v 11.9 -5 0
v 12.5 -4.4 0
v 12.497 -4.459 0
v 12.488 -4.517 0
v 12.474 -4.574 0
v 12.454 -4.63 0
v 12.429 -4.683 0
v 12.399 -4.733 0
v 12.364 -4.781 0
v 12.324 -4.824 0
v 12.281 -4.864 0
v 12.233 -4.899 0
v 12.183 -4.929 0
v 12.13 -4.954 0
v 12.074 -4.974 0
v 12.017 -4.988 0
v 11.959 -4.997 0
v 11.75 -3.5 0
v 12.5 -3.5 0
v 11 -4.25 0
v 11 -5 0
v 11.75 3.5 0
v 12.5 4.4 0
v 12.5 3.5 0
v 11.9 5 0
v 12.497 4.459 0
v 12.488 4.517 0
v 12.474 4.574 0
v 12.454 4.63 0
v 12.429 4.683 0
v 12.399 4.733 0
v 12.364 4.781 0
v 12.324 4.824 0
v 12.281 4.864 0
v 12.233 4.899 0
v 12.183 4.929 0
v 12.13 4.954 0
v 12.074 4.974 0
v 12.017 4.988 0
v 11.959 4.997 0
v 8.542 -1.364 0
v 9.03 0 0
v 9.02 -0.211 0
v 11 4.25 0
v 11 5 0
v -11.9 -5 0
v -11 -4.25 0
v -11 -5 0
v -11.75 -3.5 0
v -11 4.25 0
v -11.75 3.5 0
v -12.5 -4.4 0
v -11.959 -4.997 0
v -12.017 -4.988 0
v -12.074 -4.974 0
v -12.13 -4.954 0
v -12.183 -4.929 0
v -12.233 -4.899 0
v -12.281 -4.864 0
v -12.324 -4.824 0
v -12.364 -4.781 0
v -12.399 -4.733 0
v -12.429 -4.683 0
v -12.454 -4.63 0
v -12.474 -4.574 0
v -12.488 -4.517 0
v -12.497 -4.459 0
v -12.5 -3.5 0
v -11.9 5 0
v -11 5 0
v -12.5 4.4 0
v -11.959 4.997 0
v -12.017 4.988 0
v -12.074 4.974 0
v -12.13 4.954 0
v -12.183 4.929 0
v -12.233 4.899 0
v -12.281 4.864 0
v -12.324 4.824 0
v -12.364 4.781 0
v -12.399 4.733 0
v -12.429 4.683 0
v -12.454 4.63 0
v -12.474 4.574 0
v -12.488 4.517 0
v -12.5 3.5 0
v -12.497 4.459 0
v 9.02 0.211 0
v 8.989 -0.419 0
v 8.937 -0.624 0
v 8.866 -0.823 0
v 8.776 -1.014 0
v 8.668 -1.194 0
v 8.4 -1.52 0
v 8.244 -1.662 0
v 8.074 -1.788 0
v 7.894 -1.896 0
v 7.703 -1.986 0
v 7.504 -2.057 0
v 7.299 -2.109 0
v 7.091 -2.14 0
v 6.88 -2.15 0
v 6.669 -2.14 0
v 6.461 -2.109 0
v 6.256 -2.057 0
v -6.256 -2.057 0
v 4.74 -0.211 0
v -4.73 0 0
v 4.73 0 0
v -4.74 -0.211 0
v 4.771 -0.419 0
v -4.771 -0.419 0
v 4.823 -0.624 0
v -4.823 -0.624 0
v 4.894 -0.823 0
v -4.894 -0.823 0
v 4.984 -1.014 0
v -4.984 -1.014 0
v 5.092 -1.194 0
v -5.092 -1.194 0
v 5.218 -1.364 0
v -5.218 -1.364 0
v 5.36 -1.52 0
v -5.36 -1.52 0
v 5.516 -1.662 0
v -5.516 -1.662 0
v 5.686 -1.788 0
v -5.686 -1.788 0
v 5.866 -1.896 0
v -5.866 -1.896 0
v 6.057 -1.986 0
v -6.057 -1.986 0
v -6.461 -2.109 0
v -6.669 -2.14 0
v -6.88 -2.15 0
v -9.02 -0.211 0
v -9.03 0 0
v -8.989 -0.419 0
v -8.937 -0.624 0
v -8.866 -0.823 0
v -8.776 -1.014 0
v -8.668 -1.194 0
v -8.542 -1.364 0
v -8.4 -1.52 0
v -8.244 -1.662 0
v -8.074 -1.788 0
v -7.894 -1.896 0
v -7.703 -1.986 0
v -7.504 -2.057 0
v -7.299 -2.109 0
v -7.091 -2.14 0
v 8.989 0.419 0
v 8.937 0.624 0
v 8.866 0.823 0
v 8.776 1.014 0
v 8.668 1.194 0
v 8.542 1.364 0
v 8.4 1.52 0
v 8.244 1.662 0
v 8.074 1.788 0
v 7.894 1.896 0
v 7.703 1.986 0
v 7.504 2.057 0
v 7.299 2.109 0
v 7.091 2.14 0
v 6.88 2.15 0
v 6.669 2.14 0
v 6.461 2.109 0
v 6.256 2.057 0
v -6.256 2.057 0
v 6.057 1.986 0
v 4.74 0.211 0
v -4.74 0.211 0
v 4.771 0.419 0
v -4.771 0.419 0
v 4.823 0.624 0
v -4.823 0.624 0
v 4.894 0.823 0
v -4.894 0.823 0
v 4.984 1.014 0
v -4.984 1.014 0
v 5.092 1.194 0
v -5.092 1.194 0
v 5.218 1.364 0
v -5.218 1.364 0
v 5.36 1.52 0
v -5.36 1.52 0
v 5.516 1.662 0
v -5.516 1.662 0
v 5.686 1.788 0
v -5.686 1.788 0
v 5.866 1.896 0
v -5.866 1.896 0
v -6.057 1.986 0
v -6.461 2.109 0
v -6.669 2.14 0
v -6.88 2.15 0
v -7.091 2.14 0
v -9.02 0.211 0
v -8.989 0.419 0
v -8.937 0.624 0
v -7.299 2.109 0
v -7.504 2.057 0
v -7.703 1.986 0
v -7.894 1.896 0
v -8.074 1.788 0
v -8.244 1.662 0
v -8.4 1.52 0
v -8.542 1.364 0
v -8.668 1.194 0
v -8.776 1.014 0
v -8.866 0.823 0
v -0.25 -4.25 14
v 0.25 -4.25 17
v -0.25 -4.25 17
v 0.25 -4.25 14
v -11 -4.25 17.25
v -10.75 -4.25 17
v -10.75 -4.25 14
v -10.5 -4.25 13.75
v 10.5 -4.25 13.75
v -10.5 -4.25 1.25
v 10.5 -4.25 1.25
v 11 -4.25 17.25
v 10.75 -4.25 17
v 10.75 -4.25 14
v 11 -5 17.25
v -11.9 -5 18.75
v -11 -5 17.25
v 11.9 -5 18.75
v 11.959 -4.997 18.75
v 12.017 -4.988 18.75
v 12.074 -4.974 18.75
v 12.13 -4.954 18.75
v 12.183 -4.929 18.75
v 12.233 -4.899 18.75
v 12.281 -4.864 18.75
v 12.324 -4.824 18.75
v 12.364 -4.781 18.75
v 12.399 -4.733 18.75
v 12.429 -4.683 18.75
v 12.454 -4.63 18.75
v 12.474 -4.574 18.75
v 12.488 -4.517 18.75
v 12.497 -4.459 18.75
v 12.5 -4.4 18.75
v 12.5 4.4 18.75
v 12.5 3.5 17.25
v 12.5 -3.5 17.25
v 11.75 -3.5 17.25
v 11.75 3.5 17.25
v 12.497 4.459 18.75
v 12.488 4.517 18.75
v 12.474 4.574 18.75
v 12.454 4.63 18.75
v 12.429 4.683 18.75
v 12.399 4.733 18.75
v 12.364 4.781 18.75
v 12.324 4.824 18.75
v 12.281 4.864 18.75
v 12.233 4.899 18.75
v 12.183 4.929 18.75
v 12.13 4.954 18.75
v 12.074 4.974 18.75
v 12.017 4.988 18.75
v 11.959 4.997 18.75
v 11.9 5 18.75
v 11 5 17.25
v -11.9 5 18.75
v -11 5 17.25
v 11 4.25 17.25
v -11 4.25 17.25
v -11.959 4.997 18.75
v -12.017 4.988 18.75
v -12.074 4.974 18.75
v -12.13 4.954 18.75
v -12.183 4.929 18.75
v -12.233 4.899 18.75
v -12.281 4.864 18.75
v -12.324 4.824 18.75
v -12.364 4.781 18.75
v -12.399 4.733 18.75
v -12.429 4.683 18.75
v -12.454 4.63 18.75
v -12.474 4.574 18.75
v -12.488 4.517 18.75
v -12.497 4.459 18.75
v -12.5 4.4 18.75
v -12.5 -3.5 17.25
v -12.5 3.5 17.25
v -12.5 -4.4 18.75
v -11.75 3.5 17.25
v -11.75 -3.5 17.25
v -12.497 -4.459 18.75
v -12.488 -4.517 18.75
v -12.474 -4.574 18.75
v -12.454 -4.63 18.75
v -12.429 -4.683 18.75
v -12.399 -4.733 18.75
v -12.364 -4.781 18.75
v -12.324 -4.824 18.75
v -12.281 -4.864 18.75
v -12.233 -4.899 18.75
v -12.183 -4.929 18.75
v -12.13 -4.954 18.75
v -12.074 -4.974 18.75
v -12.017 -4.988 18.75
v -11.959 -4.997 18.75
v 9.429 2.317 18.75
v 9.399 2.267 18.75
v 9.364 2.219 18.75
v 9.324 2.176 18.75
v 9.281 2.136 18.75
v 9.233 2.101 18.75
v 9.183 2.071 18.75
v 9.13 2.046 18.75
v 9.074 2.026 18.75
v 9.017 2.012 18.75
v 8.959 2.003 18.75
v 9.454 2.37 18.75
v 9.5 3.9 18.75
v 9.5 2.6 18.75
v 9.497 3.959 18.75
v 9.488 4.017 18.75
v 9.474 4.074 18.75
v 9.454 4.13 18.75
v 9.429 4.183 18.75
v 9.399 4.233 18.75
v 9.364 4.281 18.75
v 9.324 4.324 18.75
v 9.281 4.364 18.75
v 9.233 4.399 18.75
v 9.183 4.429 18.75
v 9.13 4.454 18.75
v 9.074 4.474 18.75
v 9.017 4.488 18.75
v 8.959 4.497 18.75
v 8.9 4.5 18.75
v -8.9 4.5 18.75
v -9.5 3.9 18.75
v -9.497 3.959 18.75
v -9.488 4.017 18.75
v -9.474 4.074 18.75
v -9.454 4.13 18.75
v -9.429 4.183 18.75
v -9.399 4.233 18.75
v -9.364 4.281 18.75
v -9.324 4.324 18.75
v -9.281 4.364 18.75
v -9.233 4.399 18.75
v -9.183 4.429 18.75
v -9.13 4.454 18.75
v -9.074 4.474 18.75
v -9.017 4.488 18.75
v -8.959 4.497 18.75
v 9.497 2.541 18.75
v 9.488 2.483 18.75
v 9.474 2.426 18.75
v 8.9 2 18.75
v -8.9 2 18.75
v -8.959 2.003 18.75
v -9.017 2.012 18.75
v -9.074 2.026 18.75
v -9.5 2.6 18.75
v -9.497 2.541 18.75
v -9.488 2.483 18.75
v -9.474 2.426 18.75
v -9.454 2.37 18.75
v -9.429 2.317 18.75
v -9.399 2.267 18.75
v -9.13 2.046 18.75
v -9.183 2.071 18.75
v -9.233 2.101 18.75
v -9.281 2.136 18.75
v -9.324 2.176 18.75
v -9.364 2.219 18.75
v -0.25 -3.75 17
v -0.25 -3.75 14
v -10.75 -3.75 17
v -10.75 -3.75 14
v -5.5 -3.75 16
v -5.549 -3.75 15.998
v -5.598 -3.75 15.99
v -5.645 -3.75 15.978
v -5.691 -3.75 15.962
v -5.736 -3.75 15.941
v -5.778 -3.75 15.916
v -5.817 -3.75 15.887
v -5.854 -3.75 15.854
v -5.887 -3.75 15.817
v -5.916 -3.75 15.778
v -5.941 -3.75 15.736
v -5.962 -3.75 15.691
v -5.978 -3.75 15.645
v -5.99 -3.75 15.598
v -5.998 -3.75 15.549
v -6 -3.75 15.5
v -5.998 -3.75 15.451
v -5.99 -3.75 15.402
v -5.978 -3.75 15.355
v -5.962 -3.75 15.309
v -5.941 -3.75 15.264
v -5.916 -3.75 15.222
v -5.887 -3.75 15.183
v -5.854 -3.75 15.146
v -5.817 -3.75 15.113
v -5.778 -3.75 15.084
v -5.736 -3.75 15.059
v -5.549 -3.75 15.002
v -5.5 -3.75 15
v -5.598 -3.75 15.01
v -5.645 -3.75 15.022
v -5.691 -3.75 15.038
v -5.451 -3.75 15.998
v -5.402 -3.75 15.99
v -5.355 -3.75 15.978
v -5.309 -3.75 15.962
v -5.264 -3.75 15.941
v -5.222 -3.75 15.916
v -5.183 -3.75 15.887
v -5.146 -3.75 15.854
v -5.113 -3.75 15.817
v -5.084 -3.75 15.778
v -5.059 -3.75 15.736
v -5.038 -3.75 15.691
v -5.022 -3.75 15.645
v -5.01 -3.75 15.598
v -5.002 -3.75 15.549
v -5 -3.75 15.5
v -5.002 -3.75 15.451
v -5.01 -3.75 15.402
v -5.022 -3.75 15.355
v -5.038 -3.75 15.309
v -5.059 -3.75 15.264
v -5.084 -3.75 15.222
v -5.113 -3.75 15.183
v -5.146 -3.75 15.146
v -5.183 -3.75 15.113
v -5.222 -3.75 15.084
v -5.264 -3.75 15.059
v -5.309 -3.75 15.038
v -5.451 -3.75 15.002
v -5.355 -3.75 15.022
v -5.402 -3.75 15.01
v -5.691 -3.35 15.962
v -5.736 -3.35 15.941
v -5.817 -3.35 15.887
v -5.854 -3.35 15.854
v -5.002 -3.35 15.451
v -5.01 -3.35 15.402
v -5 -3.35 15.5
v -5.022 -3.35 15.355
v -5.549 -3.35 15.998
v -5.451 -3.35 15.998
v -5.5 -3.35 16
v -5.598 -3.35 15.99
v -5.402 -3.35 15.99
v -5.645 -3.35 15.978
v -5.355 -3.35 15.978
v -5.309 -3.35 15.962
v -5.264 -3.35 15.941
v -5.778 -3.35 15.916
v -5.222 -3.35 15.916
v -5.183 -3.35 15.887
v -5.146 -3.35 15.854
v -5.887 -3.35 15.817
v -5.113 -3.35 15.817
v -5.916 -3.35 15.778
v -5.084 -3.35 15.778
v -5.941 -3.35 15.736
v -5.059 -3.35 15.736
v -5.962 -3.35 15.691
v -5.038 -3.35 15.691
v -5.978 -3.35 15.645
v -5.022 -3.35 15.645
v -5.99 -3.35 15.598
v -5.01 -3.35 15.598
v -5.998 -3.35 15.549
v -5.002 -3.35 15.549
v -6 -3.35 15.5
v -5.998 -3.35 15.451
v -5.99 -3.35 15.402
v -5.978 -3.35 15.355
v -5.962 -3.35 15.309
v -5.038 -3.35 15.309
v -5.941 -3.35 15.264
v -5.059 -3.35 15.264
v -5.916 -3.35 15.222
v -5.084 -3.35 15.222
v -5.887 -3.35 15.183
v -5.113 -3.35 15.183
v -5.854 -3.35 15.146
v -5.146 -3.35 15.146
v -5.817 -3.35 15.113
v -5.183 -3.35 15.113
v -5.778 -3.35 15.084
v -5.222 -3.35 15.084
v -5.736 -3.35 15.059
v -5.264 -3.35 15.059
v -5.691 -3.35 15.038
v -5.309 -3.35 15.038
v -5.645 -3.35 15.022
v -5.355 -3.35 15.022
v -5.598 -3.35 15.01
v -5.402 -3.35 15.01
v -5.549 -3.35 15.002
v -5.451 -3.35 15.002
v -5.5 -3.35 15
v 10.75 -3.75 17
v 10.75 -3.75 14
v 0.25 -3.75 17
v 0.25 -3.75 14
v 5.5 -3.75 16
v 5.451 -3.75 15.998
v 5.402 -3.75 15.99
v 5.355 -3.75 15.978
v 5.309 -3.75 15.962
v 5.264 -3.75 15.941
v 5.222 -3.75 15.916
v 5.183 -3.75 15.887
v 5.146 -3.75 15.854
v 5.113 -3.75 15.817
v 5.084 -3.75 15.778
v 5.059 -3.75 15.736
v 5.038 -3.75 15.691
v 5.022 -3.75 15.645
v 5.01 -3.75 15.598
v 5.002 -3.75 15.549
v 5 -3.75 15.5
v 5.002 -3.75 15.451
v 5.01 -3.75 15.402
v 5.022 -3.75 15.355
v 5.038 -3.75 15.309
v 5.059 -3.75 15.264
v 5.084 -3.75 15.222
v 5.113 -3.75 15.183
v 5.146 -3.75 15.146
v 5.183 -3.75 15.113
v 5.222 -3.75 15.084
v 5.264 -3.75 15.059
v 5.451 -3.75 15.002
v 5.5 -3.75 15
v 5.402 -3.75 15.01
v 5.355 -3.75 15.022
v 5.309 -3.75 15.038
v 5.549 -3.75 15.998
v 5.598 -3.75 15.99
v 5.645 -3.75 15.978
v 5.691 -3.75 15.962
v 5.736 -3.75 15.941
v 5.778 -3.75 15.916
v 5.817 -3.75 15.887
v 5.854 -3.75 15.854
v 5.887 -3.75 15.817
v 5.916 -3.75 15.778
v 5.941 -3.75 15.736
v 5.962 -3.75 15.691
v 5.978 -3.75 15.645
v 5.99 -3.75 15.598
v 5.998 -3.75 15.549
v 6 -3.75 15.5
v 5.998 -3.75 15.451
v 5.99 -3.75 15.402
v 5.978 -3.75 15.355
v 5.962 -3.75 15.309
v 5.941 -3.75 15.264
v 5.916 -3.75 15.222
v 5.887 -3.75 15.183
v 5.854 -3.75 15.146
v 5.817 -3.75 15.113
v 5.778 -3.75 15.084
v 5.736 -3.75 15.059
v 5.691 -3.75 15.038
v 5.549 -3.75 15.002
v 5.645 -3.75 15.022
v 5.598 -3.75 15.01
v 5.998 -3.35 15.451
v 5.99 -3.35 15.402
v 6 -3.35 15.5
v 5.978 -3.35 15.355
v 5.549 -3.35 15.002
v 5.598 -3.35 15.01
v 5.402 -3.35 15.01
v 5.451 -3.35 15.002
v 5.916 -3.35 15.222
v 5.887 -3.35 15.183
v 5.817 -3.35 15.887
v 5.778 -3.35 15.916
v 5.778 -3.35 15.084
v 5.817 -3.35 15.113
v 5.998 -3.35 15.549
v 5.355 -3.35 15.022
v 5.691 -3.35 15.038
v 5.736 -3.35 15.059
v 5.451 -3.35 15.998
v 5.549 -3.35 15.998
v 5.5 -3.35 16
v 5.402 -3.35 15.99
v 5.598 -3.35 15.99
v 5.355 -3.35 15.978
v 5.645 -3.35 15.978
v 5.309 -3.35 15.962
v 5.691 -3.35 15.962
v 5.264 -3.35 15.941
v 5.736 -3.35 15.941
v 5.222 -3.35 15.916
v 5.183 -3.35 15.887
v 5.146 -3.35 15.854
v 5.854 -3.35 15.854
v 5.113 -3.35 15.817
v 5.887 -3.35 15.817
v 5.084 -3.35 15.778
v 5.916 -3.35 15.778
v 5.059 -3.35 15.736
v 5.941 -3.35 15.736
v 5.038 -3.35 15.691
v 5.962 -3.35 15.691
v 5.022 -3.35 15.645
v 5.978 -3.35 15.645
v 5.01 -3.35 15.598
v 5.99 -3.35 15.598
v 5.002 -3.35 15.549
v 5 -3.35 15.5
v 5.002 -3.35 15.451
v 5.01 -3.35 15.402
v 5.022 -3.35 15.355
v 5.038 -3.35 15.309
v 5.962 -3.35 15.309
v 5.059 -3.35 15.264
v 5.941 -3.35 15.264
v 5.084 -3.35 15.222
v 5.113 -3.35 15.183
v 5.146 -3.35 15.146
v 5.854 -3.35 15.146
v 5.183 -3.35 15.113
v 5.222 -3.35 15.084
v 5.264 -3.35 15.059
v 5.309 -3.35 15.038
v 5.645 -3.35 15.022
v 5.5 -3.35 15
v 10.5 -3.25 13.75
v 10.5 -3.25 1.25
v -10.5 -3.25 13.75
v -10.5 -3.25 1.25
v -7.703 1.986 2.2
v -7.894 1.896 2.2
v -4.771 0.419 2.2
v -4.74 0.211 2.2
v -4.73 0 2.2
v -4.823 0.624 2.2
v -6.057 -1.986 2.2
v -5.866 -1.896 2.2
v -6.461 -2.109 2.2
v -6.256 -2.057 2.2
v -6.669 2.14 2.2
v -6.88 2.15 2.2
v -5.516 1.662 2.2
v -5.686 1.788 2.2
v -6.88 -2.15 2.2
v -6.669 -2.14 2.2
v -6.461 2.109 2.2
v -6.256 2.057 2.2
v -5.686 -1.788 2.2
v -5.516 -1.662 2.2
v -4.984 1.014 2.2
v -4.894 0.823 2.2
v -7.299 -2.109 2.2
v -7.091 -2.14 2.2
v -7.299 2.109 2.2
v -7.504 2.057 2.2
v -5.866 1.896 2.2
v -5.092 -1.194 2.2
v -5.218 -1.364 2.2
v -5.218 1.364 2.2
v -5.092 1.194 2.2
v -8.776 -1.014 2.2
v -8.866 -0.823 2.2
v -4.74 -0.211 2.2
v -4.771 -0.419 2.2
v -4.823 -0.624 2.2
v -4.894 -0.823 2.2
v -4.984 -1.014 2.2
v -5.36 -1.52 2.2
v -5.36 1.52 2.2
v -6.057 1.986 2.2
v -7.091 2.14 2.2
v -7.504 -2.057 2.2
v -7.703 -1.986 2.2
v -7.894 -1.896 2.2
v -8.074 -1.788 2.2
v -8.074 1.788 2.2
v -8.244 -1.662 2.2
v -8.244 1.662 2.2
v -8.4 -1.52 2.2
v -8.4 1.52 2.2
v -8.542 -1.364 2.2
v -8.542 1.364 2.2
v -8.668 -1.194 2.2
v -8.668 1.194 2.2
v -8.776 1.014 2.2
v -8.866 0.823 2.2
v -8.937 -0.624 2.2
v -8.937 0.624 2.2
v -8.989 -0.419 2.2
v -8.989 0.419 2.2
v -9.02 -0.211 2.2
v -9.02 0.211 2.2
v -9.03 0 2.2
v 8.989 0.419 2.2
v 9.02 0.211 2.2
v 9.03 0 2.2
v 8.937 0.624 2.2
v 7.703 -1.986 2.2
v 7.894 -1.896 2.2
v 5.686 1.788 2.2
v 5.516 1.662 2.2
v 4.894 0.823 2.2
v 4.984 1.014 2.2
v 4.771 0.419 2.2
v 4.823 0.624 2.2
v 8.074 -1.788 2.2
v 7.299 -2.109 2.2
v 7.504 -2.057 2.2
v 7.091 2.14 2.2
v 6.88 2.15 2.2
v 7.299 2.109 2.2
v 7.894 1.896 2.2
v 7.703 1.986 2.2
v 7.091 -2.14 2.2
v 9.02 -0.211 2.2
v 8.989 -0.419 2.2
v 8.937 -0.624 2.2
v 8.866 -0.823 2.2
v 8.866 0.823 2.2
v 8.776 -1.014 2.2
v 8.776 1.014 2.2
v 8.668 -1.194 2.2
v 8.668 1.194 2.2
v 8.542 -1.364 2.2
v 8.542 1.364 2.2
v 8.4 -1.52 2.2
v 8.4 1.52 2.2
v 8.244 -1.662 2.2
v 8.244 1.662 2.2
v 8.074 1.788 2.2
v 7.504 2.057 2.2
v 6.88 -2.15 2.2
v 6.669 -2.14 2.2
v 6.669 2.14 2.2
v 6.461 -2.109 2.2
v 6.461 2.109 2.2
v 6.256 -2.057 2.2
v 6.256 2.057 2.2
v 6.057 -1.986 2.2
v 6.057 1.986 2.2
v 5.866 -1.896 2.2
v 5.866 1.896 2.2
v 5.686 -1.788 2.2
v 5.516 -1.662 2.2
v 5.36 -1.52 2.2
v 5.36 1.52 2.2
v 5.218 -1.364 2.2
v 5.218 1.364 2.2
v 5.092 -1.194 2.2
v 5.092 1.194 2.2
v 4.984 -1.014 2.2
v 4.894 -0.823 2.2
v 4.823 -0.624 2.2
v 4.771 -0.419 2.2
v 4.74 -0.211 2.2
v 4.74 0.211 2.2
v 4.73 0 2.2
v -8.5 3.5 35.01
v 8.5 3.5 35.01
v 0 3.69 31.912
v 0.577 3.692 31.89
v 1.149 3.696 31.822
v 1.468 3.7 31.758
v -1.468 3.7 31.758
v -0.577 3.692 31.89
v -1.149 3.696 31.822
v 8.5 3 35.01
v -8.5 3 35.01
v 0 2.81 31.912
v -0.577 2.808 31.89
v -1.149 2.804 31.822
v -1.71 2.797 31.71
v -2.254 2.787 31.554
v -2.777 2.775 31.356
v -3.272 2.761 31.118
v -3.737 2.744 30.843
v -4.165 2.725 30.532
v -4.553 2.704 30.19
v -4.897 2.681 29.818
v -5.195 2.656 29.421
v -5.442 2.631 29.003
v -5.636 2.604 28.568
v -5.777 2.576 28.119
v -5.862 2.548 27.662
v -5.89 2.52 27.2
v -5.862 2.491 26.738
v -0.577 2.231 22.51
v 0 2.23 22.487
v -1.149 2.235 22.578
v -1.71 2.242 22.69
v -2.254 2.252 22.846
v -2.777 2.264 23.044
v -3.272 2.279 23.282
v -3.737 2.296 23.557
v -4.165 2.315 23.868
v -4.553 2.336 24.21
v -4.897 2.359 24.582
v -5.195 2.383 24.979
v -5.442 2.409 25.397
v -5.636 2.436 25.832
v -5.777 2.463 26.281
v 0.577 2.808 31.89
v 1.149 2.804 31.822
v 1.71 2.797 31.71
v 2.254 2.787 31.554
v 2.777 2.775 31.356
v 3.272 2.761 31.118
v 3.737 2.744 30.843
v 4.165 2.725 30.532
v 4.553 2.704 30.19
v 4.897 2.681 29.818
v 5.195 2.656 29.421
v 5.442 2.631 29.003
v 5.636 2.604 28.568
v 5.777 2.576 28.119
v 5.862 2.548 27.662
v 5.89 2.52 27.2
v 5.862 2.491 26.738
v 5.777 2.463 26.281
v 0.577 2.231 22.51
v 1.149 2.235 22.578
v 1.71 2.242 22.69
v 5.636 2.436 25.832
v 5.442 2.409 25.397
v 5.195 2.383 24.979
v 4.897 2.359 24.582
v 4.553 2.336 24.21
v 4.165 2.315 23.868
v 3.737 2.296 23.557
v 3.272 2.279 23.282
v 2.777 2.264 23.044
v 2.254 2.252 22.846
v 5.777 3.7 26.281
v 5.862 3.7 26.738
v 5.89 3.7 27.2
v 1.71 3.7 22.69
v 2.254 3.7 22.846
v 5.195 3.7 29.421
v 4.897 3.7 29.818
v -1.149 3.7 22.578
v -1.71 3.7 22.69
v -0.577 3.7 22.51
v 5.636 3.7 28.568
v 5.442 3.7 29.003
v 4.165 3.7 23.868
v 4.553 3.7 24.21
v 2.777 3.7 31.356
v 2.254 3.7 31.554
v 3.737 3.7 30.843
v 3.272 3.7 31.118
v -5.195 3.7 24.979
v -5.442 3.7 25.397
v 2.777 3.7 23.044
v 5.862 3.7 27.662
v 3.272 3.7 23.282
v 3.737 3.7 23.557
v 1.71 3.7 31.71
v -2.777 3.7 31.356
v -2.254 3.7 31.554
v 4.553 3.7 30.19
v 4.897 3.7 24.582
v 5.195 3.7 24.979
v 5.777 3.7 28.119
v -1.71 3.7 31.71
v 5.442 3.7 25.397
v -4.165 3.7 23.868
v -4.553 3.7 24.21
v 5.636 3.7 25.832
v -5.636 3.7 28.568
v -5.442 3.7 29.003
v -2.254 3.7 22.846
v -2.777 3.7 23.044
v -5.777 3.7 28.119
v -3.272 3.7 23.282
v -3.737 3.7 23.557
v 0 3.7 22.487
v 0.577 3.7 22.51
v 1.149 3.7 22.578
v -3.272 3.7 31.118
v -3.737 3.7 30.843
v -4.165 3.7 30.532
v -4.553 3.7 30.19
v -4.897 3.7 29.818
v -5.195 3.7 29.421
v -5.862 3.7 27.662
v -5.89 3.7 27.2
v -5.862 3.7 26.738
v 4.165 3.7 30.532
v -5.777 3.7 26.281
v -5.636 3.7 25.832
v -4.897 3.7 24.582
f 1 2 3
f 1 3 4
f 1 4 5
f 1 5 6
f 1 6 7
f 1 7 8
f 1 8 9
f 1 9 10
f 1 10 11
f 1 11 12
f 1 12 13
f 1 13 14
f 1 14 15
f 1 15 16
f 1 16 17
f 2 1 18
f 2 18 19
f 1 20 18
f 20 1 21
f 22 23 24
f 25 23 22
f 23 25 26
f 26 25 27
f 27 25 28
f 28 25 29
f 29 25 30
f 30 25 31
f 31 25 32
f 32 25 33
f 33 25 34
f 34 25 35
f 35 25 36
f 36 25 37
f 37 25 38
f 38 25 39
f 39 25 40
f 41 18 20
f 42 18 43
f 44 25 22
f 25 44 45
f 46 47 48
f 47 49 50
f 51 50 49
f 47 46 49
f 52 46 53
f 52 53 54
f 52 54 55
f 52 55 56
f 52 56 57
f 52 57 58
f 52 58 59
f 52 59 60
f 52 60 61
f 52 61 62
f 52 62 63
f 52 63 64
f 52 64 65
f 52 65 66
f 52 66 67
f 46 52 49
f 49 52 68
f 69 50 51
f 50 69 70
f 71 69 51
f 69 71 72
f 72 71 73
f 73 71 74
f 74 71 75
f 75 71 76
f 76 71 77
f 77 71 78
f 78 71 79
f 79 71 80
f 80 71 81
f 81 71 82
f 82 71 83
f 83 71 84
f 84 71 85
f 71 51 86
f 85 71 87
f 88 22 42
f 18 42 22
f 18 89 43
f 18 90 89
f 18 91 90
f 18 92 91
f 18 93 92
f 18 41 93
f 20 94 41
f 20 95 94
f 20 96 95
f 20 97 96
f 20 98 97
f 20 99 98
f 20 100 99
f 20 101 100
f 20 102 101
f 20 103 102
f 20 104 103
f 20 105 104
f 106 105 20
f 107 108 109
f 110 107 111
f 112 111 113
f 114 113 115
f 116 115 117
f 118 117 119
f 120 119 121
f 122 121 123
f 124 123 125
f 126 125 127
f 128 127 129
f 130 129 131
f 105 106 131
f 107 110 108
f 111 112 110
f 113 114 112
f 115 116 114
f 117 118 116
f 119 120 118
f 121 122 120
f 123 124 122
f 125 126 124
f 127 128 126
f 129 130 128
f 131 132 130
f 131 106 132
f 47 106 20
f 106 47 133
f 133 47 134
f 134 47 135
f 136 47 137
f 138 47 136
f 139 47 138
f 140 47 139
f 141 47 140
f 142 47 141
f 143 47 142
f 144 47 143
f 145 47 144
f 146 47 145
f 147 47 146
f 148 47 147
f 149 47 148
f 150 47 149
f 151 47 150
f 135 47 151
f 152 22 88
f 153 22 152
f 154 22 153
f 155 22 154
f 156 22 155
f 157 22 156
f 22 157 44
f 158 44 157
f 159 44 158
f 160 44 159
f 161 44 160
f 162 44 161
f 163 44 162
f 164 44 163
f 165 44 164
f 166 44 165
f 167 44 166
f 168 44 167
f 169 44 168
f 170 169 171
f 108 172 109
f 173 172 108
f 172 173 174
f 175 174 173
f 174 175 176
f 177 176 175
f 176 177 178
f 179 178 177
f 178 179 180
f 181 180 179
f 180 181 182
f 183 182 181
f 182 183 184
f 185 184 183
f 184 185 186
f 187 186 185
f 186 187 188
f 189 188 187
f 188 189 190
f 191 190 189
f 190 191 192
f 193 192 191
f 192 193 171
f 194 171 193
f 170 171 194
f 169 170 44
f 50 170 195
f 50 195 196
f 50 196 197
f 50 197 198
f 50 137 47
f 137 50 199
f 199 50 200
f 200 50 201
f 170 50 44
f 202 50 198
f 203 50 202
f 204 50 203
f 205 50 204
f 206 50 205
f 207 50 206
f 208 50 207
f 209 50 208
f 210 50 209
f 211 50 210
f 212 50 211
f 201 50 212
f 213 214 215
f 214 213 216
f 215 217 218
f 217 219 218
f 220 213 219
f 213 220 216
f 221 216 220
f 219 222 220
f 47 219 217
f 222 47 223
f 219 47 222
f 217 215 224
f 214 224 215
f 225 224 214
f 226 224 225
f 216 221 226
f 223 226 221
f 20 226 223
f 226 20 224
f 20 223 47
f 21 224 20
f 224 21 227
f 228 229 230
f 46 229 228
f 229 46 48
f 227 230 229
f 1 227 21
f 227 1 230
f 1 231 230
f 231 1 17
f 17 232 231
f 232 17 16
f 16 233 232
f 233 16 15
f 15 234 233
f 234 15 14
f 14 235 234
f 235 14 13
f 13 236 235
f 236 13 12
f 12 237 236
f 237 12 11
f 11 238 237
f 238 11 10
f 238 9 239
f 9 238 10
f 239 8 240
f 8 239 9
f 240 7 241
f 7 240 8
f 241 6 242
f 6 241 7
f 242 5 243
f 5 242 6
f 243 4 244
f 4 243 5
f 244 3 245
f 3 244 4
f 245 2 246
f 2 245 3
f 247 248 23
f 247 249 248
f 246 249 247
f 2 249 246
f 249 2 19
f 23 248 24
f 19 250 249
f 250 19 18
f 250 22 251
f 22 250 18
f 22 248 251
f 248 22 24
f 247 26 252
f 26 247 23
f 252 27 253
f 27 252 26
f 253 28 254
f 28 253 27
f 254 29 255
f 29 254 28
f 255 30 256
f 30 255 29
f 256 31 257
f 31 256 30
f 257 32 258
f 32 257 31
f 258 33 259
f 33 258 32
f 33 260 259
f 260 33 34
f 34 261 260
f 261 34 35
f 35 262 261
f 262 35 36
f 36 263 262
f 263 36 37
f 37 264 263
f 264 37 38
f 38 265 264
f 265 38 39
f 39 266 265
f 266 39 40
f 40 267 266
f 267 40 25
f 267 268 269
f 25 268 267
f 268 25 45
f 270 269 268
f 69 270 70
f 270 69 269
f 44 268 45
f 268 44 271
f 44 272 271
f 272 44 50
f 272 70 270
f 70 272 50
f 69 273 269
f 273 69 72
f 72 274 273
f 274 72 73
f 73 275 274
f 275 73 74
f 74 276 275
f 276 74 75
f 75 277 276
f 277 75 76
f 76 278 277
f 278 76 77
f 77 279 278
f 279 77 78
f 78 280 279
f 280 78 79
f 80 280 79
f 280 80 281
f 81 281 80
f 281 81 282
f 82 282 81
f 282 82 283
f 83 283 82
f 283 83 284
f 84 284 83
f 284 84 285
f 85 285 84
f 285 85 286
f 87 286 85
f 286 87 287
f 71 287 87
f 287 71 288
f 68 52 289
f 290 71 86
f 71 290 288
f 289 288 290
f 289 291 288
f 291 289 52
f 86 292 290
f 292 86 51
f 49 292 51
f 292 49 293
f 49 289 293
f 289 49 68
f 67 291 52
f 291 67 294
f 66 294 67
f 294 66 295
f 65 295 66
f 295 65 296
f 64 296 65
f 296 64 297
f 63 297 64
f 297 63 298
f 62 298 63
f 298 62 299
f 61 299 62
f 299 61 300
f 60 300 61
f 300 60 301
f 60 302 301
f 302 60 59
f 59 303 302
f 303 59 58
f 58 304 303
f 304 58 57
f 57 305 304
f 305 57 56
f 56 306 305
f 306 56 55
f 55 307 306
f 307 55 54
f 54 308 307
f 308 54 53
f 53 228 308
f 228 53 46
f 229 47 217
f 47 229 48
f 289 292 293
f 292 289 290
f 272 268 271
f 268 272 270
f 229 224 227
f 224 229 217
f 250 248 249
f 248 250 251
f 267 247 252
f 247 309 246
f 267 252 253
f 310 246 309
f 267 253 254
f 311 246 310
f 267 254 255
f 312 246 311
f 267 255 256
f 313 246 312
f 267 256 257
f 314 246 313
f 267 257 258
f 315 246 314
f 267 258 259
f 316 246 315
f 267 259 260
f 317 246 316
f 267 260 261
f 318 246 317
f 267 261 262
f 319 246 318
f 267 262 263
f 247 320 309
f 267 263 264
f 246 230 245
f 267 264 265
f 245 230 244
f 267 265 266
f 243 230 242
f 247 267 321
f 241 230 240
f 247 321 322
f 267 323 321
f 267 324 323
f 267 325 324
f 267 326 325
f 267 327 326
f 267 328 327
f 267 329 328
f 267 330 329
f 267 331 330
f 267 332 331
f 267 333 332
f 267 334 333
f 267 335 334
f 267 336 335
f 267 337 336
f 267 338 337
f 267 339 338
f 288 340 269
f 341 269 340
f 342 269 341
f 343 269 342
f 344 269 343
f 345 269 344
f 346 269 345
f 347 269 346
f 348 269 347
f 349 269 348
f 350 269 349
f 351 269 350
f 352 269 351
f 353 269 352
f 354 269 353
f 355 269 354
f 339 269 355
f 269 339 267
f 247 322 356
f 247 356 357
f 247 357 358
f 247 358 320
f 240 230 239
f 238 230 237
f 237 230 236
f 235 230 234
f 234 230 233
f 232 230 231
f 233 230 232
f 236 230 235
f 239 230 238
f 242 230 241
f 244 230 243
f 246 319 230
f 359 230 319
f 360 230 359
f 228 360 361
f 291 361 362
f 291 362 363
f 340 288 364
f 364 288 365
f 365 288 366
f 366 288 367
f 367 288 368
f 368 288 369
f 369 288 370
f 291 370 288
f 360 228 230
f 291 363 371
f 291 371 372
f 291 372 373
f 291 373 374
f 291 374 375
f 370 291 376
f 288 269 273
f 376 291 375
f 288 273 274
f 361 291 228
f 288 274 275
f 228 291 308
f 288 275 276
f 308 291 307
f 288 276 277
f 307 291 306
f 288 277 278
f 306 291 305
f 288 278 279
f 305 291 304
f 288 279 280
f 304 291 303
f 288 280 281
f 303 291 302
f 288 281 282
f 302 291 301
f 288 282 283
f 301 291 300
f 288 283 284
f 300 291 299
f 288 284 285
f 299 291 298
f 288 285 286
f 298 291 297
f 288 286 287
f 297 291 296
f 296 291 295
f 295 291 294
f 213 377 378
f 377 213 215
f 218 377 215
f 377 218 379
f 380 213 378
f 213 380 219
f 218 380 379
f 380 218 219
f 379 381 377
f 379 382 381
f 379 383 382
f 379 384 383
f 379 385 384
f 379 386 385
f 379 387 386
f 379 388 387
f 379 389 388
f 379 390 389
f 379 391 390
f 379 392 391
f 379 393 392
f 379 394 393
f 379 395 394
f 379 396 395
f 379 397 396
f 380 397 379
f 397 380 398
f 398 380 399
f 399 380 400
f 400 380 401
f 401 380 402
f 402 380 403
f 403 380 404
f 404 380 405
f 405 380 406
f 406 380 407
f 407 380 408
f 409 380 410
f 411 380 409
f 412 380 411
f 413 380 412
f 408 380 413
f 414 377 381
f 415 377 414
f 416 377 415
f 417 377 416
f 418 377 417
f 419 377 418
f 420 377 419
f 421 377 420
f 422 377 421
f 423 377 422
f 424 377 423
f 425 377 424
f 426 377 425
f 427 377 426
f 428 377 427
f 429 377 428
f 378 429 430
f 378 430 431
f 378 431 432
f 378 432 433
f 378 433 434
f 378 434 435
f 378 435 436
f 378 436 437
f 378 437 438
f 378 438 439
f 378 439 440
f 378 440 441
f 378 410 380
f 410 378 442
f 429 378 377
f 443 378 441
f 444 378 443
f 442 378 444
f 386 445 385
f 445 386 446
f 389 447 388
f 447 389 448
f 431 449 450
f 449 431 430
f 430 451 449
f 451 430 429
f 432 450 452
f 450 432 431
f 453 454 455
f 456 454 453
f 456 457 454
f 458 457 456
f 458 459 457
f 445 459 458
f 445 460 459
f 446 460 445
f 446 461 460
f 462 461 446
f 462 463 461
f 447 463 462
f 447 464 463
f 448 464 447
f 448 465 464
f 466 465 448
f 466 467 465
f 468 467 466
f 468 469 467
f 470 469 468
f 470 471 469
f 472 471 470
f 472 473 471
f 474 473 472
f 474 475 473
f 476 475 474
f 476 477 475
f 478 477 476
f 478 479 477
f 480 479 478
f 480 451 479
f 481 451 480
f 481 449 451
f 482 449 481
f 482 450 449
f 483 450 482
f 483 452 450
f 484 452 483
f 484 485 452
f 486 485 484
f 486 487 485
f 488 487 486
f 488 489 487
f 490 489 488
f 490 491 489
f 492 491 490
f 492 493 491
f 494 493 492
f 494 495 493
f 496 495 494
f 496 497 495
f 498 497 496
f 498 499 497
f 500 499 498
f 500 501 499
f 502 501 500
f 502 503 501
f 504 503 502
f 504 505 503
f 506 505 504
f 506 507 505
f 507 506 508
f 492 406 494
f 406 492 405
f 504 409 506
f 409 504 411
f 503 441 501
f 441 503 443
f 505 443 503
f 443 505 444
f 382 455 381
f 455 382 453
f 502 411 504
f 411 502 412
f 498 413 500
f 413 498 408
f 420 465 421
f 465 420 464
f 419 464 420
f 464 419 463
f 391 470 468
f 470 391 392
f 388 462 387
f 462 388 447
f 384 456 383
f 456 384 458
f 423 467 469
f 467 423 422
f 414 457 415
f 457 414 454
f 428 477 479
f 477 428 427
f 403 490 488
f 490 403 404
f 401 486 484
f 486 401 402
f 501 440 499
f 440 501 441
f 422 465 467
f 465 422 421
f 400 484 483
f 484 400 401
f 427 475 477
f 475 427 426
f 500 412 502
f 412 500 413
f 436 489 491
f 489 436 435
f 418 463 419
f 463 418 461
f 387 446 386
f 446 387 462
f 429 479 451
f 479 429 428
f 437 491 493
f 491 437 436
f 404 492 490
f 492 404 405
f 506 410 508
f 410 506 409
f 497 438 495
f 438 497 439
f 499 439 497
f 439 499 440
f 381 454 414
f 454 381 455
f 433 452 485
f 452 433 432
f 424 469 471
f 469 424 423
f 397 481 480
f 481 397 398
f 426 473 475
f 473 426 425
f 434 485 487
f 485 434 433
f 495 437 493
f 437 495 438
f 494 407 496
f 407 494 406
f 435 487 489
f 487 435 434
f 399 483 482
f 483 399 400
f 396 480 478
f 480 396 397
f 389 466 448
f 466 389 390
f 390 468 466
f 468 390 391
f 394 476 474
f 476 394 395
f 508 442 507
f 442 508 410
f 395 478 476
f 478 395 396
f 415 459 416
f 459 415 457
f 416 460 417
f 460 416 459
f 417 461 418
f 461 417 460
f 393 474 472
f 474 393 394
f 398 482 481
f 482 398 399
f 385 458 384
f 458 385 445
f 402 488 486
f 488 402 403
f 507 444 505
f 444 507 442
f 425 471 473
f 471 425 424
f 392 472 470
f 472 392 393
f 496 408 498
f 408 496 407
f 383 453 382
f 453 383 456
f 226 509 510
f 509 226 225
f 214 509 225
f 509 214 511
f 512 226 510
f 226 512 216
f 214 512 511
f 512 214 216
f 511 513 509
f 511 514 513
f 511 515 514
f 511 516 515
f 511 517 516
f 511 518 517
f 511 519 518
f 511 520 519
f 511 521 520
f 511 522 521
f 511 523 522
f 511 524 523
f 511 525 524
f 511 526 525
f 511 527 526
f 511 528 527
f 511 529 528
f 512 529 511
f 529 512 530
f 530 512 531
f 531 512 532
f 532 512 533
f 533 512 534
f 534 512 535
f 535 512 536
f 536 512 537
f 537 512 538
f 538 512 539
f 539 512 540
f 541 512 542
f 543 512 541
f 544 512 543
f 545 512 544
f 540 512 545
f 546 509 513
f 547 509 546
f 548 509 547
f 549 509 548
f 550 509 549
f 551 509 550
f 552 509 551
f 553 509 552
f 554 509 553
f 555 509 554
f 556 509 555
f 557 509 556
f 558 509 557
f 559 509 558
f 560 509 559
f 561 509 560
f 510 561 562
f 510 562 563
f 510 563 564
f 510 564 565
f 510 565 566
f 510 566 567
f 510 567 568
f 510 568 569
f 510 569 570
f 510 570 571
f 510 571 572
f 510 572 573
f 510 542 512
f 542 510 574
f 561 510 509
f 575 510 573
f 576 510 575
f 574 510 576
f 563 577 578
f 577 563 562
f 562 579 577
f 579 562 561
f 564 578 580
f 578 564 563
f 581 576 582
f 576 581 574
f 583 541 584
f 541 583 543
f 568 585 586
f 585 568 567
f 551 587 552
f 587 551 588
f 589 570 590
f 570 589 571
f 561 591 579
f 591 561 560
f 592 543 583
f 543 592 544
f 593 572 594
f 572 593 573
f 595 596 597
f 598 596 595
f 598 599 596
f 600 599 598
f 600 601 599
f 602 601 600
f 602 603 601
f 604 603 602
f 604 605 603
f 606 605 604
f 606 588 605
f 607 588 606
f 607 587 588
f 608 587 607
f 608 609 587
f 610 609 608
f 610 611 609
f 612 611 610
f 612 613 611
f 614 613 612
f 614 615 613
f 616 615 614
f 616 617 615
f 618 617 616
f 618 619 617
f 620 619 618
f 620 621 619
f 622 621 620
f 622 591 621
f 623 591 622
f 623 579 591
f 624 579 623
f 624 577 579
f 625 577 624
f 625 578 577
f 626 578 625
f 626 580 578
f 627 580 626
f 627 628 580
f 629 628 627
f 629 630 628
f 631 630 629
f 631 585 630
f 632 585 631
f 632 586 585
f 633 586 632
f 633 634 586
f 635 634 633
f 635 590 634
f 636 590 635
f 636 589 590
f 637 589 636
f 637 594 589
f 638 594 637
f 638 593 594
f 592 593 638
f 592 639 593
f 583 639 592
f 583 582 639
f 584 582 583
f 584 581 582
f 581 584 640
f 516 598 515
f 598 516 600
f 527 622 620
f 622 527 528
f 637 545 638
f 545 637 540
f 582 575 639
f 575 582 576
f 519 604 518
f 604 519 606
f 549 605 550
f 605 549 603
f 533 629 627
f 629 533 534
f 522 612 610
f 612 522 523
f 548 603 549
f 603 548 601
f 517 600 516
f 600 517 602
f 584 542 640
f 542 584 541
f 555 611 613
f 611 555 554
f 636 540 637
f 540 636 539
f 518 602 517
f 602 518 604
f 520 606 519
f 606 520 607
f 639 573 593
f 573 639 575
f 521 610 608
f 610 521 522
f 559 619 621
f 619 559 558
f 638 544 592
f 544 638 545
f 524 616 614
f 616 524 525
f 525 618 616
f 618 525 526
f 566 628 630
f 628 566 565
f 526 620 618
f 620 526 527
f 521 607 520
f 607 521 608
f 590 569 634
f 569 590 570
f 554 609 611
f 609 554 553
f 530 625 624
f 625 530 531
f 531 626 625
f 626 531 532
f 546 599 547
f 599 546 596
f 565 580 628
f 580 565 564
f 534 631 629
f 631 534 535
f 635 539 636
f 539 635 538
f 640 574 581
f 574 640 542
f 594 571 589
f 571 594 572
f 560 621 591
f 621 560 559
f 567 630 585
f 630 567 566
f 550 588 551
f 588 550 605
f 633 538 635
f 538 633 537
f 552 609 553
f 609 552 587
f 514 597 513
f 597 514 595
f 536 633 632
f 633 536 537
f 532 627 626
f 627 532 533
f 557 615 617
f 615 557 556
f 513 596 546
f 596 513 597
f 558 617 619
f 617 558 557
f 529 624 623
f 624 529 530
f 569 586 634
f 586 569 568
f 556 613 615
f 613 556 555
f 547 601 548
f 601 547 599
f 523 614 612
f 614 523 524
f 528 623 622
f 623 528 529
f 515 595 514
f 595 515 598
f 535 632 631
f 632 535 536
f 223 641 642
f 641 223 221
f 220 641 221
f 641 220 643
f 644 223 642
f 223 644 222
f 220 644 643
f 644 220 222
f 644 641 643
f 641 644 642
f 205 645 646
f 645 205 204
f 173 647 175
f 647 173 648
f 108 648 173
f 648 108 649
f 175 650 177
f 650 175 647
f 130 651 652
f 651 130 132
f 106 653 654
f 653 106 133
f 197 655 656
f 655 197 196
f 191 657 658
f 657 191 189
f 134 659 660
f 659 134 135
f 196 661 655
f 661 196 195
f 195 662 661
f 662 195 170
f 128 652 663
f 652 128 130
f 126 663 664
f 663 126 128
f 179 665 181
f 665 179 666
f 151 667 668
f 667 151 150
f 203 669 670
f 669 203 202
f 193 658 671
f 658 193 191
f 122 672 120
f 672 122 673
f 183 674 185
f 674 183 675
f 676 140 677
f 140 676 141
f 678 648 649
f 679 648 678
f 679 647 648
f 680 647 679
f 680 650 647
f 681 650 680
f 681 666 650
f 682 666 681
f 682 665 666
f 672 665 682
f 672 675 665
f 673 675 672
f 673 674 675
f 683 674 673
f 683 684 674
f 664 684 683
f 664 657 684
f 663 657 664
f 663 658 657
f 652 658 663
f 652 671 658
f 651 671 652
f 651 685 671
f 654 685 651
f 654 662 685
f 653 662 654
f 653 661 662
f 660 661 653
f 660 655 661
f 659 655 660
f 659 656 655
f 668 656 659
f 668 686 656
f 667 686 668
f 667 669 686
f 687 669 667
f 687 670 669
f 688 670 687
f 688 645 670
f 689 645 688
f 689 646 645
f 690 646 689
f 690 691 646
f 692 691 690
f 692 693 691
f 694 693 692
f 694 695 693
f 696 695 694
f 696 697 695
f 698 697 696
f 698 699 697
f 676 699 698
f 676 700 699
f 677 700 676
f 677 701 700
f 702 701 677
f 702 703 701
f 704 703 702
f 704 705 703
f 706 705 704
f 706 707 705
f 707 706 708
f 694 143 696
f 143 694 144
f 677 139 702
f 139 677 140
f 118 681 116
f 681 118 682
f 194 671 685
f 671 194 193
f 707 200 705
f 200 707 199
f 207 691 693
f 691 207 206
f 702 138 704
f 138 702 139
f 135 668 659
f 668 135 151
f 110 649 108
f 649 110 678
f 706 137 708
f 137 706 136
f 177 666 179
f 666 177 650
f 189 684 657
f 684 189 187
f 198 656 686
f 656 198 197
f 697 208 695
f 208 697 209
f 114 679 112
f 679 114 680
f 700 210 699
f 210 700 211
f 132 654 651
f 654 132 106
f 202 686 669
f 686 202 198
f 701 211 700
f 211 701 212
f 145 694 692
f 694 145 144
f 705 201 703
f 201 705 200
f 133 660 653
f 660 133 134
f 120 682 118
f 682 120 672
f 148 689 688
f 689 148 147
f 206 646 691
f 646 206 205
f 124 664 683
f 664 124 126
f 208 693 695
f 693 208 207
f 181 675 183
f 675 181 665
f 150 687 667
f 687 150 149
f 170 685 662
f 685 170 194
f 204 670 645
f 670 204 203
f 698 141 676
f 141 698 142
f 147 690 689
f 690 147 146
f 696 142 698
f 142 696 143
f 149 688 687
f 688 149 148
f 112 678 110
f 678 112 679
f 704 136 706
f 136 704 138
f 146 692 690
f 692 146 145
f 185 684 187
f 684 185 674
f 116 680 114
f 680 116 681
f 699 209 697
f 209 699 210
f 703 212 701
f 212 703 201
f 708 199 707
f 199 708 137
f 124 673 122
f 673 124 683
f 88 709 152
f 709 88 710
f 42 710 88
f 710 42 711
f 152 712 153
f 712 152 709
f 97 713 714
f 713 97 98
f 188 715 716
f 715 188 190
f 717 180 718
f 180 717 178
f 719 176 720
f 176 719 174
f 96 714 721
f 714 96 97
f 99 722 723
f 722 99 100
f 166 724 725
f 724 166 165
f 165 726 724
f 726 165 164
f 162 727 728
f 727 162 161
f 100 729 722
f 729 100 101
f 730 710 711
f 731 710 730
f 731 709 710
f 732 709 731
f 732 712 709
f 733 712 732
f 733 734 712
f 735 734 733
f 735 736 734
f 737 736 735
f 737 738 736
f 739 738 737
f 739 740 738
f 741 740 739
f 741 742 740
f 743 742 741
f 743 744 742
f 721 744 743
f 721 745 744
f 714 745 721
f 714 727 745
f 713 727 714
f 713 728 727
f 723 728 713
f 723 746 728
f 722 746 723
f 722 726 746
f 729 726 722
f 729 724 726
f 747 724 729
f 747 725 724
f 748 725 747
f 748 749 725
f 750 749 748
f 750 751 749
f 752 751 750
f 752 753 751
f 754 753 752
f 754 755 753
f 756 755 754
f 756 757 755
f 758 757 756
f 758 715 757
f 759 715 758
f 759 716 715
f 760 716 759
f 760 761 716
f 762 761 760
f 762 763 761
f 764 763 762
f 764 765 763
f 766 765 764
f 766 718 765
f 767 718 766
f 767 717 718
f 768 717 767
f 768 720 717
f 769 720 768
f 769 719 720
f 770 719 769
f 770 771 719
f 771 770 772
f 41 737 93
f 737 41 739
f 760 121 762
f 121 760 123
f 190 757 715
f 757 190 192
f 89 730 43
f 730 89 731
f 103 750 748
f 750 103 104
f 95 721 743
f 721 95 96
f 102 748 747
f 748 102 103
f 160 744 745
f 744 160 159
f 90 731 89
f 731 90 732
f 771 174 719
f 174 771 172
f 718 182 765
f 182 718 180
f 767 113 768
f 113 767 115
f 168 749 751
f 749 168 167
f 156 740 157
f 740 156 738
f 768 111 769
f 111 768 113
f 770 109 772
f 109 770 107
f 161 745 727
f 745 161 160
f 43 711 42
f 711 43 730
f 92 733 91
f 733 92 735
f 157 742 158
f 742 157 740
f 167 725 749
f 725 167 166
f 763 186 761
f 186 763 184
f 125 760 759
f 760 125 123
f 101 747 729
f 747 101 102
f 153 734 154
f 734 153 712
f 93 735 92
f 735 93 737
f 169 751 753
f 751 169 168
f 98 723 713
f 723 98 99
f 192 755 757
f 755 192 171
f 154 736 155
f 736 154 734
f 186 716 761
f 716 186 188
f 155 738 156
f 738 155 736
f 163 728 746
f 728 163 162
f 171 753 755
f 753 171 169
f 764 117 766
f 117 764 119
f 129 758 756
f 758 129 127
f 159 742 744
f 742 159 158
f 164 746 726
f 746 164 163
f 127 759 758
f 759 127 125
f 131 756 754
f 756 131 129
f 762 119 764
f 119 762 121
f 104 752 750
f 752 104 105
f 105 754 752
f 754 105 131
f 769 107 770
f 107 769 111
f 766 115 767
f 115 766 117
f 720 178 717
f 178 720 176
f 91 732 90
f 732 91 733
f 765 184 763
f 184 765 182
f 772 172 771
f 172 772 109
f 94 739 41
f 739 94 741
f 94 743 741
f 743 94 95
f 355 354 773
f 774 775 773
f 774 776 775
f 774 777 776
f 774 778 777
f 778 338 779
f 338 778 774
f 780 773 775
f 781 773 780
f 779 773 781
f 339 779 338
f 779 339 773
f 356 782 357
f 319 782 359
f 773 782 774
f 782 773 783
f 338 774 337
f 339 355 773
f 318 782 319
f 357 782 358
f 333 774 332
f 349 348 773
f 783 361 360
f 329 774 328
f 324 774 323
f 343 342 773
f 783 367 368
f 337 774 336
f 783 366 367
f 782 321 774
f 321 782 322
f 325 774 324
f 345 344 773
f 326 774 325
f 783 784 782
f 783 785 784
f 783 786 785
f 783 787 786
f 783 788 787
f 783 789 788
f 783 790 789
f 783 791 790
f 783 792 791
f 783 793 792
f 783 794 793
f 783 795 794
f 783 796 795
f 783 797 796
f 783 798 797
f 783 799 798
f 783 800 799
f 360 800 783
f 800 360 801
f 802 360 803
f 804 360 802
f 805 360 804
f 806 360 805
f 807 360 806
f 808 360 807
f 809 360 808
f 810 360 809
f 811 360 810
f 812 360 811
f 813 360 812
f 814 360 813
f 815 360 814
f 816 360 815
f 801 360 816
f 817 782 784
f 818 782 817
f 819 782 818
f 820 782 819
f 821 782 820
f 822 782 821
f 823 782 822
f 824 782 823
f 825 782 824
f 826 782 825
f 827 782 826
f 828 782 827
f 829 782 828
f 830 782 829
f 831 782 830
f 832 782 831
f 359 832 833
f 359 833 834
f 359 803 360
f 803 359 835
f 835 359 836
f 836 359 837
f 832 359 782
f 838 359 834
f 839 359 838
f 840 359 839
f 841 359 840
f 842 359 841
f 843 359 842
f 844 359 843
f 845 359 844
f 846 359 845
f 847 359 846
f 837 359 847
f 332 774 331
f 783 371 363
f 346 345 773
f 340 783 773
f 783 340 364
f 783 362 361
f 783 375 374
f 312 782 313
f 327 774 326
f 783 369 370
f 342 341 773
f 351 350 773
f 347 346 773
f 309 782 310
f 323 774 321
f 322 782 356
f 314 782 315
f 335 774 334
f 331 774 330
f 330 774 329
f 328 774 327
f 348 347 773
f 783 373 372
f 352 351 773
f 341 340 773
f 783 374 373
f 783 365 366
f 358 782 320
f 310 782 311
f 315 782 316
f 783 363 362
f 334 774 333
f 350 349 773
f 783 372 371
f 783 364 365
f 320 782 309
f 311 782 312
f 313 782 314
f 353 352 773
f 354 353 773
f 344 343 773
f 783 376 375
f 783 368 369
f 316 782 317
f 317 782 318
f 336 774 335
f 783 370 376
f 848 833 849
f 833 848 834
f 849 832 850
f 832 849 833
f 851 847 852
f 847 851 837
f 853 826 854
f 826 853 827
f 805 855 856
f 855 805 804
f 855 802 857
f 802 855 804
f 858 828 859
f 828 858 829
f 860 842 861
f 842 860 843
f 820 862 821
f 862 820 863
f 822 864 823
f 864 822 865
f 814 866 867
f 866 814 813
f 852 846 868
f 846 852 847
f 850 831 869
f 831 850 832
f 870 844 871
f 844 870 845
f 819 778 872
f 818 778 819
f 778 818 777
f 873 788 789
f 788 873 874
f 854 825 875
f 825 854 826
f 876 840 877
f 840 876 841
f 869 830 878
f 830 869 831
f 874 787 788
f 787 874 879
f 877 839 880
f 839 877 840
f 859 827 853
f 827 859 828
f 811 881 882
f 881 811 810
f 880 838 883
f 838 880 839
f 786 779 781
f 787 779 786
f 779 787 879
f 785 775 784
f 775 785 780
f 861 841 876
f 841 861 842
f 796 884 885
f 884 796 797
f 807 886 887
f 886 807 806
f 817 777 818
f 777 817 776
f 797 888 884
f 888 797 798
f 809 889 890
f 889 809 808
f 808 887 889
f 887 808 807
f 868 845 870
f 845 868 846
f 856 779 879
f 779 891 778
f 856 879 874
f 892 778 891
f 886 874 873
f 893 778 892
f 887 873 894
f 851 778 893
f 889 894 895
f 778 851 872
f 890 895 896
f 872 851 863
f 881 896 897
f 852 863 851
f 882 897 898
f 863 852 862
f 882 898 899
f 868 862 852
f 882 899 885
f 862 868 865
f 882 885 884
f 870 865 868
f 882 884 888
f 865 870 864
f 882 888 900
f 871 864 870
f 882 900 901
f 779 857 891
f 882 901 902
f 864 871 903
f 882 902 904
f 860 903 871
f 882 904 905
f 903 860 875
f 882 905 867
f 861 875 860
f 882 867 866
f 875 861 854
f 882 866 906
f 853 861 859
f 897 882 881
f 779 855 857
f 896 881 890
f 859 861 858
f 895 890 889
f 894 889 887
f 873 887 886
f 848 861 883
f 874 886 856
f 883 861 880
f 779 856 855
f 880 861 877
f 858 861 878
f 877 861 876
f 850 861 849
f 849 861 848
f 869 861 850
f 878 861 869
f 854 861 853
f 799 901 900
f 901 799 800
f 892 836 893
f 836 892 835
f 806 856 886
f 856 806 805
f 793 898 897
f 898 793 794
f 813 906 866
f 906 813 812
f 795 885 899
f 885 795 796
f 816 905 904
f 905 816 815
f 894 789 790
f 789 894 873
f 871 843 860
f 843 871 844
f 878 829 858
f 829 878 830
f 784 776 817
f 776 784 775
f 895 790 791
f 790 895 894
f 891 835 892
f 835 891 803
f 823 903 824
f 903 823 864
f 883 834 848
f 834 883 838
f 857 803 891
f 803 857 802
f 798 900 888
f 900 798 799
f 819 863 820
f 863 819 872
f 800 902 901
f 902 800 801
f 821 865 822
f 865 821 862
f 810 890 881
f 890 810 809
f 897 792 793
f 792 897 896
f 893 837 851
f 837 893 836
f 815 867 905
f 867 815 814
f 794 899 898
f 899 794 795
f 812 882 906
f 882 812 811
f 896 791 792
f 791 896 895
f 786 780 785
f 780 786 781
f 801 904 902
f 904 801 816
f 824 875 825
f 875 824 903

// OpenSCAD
// bedroom / dressing_table — a dressing-table / vanity: an upright mirror standing along
// the back edge (+Y) of a clean top, over a shallow drawer or two on the front (-Y) face,
// on four corner legs with the knee hole between them (legged_block() in lib/common.scad).
//
// The top is still left FLAT — it is where the bottles and the hairbrush go, and cutting
// fronts into it would only read as dents in the counter. What has changed is that the
// drawers are no longer left off altogether: this file used to argue that "a real vanity's
// drawers are on its front, where a token seen from above cannot show them", which was
// true of a token with nothing but a top face. The front face is now where the rest of the
// set puts its fronts, so that is where these go — a shallow band of them under the top,
// with the leg room a vanity has left plain below.
//
// Width/Depth are the real-world footprint in cm; the Makefile renders the common vanity
// widths (80/100/120) at a slim 40 cm depth. Height is the real height of the top — desk
// height, like a table or a chest of drawers — shrunk by the plan scale like the footprint
// (see printed_h() in lib/common.scad); the mirror stands its own real height on top of
// that.

include <../lib/common.scad>

Width  = 100;  // cm
Depth  = 40;   // cm
Height = 75;   // cm — the top; the mirror adds Mirror_h above it

// the printed height, mm: Height at the plan scale
Print_h = printed_h(Height);

// -- Frame and drawers ---------------------------------------------------------
// The frame, in real cm: slim legs and a thin top, as a vanity has.
Leg      = 6;  // cm — a corner leg
Leg_rail = 3;  // cm the rail between two legs is set back behind them
Slab     = 3;  // cm of the height the top takes

Show_drawers = true;
// One shallow drawer band under the top, with the knee hole left plain below it — which is
// what a dressing table is: you sit at it. Knobs, not the kitchen's grip rail, like the
// rest of the bedroom (see unit_fronts).
Drawers  = 0;   // fronts across the band (0 = one per Drawer_width cm)
Drawer_width = 50;  // cm — nominal width of one front
Knee_h   = 55;  // cm off the floor the drawer band starts — the leg room under it
Knob_d   = 4;   // cm — a real drawer knob
// The knee hole itself, sunk deeper into the front than a drawer front is, so what you
// read between the legs is the space you put your knees in and not another panel. It is
// held clear of the magnet pocket behind it — see knee_depth().
Knee_depth = 4;  // cm
Rail_h     = 5;  // cm of leg left clear under the knee hole — the bottom rail

// -- Mirror -------------------------------------------------------------------
// The mirror is a raised board standing on the back of the top, drawn with
// cushion(): a tapered pad that narrows toward the top, so it reads as an
// upright mirror without an unsupported thin vertical wall — the taper prints
// support-free. A shallow oval is cut into its front face for the glass.
Show_mirror  = true;
Mirror_gap   = 2;    // cm kept between the board and the back edge
Mirror_d     = 10;   // cm, board depth (front-to-back) — a slim panel, but still
                     // thick enough at 1:40 (2.5 mm) to stand sturdily
Mirror_margin = 12;  // cm kept clear between the board and each side edge, so
                     // the top shows on either side (where the bottles go)
Mirror_h     = 65;   // cm the board stands above the top face (~140 cm overall)
Mirror_taper = 1;    // printed mm the board pulls in toward the top (draft) — it
                     // is a tall thin panel, so it leans in more than a cushion
// corner rounding of the board — must stay under half the board's printed depth
// (cm(Mirror_d)/2), or footprint_2d()'s inset collapses the panel to nothing
Mirror_r     = Corner_radius;
// The oval "glass", cut into the front (-Y) face of the board.
Glass_w      = 0.62;  // fraction of the board width
Glass_h      = 0.58;  // fraction of the board height
Glass_centre = 0.52;  // height of the oval centre, 0..1 up the board
// printed mm the oval is cut into the front face. The cut starts at the board's
// widest point — its base — and the face leans back by Mirror_taper on the way up,
// so it is sunk that much further to stay this deep at the top of the oval too.
Glass_depth  = 0.7;

// Magnet pockets in the bottom face, in a row along the width (0 = none). Two keep the
// piece from pivoting. They go in the rail, the broad part of the bottom face — 34 cm of it
// front to back is 8.5 mm at 1:40, comfortably wide enough for a 4 mm disc (see
// legged_floor_w() and Magnet_* in lib/common.scad).
Magnets = 2;

// How many fronts the drawer band carries: as asked for, or one per Drawer_width cm of the
// field between the legs — so an 80 cm vanity gets a single drawer and a 120 cm one a pair.
function drawers() =
    Drawers > 0 ? Drawers
                : max(1, round(legged_field_w(Width, Depth, Leg, Leg_rail) / Drawer_width));

// How deep the knee hole really goes, real cm: what was asked for, but never so deep that
// it breaks into the magnet pocket sitting on the centre line behind it — the pocket keeps
// its full wall, and a table with no magnets gets the depth it asked for.
function knee_depth() =
    Magnets > 0
        ? min(Knee_depth,
              plan_cm(cm(legged_face_d(Width, Depth, Leg_rail)) / 2
                          - magnet_pocket_d() / 2 - Magnet_inset))
        : Knee_depth;

dressing_table();

module dressing_table() {
    // the mirror board takes the back Mirror_gap + Mirror_d of the depth
    mirror_w     = Width - 2 * Mirror_margin;
    mirror_y     = Depth / 2 - Mirror_gap - Mirror_d / 2;  // cm, board centre
    mirror_front = Depth / 2 - Mirror_gap - Mirror_d;      // cm, board front edge

    union() {
        // the carcass: a clean top over the drawer band, on its four legs
        difference() {
            legged_block(Width, Depth, Print_h, Leg, Leg_rail, Slab);
            if (Show_drawers) {
                unit_fronts(legged_field_w(Width, Depth, Leg, Leg_rail), Depth,
                            rise(Knee_h),
                            legged_face_z1(Width, Depth, Print_h, Slab, Leg_rail),
                            drawers(), 1,
                            face_cm = legged_face_d(Width, Depth, Leg_rail),
                            knob_cm = Knob_d);
                // the knee hole under the drawers, sunk deeper than they are
                knee();
            }
            if (Magnets > 0)
                magnets(legged_floor_w(Width, Depth, Leg_rail),
                        legged_floor_d(Width, Depth, Leg_rail), Magnets);
        }
        // the mirror board on the back of the top, glass cut into its front face
        if (Show_mirror)
            difference() {
                translate([0, cm(mirror_y), 0])
                    cushion(mirror_w, Mirror_d, Print_h, Mirror_h, Mirror_taper,
                            Mirror_r);
                translate([0, cm(mirror_front) - 0.1,
                           Print_h + rise(Mirror_h) * Glass_centre])
                    rotate([-90, 0, 0])
                        scale([cm(mirror_w) * Glass_w / 2,
                               rise(Mirror_h) * Glass_h / 2, 1])
                            cylinder(h = Glass_depth + Mirror_taper + 0.1, r = 1);
            }
    }
}

// The knee hole: one recess across the field between the legs, from the bottom rail up to
// the drawer band, cut knee_depth() into the front — deeper than a drawer front, so the two
// are told apart by their shadow.
module knee() {
    field = legged_field_w(Width, Depth, Leg, Leg_rail);
    face  = legged_face_d(Width, Depth, Leg_rail);
    z0    = rise(Rail_h);
    z1    = rise(Knee_h);
    if (z1 - z0 > Symbol_stroke && knee_depth() > 0)
        front_recess(0, (z0 + z1) / 2, cm(field) - 2 * cm(Front_gap), z1 - z0,
                     face, cm(knee_depth()));
}
